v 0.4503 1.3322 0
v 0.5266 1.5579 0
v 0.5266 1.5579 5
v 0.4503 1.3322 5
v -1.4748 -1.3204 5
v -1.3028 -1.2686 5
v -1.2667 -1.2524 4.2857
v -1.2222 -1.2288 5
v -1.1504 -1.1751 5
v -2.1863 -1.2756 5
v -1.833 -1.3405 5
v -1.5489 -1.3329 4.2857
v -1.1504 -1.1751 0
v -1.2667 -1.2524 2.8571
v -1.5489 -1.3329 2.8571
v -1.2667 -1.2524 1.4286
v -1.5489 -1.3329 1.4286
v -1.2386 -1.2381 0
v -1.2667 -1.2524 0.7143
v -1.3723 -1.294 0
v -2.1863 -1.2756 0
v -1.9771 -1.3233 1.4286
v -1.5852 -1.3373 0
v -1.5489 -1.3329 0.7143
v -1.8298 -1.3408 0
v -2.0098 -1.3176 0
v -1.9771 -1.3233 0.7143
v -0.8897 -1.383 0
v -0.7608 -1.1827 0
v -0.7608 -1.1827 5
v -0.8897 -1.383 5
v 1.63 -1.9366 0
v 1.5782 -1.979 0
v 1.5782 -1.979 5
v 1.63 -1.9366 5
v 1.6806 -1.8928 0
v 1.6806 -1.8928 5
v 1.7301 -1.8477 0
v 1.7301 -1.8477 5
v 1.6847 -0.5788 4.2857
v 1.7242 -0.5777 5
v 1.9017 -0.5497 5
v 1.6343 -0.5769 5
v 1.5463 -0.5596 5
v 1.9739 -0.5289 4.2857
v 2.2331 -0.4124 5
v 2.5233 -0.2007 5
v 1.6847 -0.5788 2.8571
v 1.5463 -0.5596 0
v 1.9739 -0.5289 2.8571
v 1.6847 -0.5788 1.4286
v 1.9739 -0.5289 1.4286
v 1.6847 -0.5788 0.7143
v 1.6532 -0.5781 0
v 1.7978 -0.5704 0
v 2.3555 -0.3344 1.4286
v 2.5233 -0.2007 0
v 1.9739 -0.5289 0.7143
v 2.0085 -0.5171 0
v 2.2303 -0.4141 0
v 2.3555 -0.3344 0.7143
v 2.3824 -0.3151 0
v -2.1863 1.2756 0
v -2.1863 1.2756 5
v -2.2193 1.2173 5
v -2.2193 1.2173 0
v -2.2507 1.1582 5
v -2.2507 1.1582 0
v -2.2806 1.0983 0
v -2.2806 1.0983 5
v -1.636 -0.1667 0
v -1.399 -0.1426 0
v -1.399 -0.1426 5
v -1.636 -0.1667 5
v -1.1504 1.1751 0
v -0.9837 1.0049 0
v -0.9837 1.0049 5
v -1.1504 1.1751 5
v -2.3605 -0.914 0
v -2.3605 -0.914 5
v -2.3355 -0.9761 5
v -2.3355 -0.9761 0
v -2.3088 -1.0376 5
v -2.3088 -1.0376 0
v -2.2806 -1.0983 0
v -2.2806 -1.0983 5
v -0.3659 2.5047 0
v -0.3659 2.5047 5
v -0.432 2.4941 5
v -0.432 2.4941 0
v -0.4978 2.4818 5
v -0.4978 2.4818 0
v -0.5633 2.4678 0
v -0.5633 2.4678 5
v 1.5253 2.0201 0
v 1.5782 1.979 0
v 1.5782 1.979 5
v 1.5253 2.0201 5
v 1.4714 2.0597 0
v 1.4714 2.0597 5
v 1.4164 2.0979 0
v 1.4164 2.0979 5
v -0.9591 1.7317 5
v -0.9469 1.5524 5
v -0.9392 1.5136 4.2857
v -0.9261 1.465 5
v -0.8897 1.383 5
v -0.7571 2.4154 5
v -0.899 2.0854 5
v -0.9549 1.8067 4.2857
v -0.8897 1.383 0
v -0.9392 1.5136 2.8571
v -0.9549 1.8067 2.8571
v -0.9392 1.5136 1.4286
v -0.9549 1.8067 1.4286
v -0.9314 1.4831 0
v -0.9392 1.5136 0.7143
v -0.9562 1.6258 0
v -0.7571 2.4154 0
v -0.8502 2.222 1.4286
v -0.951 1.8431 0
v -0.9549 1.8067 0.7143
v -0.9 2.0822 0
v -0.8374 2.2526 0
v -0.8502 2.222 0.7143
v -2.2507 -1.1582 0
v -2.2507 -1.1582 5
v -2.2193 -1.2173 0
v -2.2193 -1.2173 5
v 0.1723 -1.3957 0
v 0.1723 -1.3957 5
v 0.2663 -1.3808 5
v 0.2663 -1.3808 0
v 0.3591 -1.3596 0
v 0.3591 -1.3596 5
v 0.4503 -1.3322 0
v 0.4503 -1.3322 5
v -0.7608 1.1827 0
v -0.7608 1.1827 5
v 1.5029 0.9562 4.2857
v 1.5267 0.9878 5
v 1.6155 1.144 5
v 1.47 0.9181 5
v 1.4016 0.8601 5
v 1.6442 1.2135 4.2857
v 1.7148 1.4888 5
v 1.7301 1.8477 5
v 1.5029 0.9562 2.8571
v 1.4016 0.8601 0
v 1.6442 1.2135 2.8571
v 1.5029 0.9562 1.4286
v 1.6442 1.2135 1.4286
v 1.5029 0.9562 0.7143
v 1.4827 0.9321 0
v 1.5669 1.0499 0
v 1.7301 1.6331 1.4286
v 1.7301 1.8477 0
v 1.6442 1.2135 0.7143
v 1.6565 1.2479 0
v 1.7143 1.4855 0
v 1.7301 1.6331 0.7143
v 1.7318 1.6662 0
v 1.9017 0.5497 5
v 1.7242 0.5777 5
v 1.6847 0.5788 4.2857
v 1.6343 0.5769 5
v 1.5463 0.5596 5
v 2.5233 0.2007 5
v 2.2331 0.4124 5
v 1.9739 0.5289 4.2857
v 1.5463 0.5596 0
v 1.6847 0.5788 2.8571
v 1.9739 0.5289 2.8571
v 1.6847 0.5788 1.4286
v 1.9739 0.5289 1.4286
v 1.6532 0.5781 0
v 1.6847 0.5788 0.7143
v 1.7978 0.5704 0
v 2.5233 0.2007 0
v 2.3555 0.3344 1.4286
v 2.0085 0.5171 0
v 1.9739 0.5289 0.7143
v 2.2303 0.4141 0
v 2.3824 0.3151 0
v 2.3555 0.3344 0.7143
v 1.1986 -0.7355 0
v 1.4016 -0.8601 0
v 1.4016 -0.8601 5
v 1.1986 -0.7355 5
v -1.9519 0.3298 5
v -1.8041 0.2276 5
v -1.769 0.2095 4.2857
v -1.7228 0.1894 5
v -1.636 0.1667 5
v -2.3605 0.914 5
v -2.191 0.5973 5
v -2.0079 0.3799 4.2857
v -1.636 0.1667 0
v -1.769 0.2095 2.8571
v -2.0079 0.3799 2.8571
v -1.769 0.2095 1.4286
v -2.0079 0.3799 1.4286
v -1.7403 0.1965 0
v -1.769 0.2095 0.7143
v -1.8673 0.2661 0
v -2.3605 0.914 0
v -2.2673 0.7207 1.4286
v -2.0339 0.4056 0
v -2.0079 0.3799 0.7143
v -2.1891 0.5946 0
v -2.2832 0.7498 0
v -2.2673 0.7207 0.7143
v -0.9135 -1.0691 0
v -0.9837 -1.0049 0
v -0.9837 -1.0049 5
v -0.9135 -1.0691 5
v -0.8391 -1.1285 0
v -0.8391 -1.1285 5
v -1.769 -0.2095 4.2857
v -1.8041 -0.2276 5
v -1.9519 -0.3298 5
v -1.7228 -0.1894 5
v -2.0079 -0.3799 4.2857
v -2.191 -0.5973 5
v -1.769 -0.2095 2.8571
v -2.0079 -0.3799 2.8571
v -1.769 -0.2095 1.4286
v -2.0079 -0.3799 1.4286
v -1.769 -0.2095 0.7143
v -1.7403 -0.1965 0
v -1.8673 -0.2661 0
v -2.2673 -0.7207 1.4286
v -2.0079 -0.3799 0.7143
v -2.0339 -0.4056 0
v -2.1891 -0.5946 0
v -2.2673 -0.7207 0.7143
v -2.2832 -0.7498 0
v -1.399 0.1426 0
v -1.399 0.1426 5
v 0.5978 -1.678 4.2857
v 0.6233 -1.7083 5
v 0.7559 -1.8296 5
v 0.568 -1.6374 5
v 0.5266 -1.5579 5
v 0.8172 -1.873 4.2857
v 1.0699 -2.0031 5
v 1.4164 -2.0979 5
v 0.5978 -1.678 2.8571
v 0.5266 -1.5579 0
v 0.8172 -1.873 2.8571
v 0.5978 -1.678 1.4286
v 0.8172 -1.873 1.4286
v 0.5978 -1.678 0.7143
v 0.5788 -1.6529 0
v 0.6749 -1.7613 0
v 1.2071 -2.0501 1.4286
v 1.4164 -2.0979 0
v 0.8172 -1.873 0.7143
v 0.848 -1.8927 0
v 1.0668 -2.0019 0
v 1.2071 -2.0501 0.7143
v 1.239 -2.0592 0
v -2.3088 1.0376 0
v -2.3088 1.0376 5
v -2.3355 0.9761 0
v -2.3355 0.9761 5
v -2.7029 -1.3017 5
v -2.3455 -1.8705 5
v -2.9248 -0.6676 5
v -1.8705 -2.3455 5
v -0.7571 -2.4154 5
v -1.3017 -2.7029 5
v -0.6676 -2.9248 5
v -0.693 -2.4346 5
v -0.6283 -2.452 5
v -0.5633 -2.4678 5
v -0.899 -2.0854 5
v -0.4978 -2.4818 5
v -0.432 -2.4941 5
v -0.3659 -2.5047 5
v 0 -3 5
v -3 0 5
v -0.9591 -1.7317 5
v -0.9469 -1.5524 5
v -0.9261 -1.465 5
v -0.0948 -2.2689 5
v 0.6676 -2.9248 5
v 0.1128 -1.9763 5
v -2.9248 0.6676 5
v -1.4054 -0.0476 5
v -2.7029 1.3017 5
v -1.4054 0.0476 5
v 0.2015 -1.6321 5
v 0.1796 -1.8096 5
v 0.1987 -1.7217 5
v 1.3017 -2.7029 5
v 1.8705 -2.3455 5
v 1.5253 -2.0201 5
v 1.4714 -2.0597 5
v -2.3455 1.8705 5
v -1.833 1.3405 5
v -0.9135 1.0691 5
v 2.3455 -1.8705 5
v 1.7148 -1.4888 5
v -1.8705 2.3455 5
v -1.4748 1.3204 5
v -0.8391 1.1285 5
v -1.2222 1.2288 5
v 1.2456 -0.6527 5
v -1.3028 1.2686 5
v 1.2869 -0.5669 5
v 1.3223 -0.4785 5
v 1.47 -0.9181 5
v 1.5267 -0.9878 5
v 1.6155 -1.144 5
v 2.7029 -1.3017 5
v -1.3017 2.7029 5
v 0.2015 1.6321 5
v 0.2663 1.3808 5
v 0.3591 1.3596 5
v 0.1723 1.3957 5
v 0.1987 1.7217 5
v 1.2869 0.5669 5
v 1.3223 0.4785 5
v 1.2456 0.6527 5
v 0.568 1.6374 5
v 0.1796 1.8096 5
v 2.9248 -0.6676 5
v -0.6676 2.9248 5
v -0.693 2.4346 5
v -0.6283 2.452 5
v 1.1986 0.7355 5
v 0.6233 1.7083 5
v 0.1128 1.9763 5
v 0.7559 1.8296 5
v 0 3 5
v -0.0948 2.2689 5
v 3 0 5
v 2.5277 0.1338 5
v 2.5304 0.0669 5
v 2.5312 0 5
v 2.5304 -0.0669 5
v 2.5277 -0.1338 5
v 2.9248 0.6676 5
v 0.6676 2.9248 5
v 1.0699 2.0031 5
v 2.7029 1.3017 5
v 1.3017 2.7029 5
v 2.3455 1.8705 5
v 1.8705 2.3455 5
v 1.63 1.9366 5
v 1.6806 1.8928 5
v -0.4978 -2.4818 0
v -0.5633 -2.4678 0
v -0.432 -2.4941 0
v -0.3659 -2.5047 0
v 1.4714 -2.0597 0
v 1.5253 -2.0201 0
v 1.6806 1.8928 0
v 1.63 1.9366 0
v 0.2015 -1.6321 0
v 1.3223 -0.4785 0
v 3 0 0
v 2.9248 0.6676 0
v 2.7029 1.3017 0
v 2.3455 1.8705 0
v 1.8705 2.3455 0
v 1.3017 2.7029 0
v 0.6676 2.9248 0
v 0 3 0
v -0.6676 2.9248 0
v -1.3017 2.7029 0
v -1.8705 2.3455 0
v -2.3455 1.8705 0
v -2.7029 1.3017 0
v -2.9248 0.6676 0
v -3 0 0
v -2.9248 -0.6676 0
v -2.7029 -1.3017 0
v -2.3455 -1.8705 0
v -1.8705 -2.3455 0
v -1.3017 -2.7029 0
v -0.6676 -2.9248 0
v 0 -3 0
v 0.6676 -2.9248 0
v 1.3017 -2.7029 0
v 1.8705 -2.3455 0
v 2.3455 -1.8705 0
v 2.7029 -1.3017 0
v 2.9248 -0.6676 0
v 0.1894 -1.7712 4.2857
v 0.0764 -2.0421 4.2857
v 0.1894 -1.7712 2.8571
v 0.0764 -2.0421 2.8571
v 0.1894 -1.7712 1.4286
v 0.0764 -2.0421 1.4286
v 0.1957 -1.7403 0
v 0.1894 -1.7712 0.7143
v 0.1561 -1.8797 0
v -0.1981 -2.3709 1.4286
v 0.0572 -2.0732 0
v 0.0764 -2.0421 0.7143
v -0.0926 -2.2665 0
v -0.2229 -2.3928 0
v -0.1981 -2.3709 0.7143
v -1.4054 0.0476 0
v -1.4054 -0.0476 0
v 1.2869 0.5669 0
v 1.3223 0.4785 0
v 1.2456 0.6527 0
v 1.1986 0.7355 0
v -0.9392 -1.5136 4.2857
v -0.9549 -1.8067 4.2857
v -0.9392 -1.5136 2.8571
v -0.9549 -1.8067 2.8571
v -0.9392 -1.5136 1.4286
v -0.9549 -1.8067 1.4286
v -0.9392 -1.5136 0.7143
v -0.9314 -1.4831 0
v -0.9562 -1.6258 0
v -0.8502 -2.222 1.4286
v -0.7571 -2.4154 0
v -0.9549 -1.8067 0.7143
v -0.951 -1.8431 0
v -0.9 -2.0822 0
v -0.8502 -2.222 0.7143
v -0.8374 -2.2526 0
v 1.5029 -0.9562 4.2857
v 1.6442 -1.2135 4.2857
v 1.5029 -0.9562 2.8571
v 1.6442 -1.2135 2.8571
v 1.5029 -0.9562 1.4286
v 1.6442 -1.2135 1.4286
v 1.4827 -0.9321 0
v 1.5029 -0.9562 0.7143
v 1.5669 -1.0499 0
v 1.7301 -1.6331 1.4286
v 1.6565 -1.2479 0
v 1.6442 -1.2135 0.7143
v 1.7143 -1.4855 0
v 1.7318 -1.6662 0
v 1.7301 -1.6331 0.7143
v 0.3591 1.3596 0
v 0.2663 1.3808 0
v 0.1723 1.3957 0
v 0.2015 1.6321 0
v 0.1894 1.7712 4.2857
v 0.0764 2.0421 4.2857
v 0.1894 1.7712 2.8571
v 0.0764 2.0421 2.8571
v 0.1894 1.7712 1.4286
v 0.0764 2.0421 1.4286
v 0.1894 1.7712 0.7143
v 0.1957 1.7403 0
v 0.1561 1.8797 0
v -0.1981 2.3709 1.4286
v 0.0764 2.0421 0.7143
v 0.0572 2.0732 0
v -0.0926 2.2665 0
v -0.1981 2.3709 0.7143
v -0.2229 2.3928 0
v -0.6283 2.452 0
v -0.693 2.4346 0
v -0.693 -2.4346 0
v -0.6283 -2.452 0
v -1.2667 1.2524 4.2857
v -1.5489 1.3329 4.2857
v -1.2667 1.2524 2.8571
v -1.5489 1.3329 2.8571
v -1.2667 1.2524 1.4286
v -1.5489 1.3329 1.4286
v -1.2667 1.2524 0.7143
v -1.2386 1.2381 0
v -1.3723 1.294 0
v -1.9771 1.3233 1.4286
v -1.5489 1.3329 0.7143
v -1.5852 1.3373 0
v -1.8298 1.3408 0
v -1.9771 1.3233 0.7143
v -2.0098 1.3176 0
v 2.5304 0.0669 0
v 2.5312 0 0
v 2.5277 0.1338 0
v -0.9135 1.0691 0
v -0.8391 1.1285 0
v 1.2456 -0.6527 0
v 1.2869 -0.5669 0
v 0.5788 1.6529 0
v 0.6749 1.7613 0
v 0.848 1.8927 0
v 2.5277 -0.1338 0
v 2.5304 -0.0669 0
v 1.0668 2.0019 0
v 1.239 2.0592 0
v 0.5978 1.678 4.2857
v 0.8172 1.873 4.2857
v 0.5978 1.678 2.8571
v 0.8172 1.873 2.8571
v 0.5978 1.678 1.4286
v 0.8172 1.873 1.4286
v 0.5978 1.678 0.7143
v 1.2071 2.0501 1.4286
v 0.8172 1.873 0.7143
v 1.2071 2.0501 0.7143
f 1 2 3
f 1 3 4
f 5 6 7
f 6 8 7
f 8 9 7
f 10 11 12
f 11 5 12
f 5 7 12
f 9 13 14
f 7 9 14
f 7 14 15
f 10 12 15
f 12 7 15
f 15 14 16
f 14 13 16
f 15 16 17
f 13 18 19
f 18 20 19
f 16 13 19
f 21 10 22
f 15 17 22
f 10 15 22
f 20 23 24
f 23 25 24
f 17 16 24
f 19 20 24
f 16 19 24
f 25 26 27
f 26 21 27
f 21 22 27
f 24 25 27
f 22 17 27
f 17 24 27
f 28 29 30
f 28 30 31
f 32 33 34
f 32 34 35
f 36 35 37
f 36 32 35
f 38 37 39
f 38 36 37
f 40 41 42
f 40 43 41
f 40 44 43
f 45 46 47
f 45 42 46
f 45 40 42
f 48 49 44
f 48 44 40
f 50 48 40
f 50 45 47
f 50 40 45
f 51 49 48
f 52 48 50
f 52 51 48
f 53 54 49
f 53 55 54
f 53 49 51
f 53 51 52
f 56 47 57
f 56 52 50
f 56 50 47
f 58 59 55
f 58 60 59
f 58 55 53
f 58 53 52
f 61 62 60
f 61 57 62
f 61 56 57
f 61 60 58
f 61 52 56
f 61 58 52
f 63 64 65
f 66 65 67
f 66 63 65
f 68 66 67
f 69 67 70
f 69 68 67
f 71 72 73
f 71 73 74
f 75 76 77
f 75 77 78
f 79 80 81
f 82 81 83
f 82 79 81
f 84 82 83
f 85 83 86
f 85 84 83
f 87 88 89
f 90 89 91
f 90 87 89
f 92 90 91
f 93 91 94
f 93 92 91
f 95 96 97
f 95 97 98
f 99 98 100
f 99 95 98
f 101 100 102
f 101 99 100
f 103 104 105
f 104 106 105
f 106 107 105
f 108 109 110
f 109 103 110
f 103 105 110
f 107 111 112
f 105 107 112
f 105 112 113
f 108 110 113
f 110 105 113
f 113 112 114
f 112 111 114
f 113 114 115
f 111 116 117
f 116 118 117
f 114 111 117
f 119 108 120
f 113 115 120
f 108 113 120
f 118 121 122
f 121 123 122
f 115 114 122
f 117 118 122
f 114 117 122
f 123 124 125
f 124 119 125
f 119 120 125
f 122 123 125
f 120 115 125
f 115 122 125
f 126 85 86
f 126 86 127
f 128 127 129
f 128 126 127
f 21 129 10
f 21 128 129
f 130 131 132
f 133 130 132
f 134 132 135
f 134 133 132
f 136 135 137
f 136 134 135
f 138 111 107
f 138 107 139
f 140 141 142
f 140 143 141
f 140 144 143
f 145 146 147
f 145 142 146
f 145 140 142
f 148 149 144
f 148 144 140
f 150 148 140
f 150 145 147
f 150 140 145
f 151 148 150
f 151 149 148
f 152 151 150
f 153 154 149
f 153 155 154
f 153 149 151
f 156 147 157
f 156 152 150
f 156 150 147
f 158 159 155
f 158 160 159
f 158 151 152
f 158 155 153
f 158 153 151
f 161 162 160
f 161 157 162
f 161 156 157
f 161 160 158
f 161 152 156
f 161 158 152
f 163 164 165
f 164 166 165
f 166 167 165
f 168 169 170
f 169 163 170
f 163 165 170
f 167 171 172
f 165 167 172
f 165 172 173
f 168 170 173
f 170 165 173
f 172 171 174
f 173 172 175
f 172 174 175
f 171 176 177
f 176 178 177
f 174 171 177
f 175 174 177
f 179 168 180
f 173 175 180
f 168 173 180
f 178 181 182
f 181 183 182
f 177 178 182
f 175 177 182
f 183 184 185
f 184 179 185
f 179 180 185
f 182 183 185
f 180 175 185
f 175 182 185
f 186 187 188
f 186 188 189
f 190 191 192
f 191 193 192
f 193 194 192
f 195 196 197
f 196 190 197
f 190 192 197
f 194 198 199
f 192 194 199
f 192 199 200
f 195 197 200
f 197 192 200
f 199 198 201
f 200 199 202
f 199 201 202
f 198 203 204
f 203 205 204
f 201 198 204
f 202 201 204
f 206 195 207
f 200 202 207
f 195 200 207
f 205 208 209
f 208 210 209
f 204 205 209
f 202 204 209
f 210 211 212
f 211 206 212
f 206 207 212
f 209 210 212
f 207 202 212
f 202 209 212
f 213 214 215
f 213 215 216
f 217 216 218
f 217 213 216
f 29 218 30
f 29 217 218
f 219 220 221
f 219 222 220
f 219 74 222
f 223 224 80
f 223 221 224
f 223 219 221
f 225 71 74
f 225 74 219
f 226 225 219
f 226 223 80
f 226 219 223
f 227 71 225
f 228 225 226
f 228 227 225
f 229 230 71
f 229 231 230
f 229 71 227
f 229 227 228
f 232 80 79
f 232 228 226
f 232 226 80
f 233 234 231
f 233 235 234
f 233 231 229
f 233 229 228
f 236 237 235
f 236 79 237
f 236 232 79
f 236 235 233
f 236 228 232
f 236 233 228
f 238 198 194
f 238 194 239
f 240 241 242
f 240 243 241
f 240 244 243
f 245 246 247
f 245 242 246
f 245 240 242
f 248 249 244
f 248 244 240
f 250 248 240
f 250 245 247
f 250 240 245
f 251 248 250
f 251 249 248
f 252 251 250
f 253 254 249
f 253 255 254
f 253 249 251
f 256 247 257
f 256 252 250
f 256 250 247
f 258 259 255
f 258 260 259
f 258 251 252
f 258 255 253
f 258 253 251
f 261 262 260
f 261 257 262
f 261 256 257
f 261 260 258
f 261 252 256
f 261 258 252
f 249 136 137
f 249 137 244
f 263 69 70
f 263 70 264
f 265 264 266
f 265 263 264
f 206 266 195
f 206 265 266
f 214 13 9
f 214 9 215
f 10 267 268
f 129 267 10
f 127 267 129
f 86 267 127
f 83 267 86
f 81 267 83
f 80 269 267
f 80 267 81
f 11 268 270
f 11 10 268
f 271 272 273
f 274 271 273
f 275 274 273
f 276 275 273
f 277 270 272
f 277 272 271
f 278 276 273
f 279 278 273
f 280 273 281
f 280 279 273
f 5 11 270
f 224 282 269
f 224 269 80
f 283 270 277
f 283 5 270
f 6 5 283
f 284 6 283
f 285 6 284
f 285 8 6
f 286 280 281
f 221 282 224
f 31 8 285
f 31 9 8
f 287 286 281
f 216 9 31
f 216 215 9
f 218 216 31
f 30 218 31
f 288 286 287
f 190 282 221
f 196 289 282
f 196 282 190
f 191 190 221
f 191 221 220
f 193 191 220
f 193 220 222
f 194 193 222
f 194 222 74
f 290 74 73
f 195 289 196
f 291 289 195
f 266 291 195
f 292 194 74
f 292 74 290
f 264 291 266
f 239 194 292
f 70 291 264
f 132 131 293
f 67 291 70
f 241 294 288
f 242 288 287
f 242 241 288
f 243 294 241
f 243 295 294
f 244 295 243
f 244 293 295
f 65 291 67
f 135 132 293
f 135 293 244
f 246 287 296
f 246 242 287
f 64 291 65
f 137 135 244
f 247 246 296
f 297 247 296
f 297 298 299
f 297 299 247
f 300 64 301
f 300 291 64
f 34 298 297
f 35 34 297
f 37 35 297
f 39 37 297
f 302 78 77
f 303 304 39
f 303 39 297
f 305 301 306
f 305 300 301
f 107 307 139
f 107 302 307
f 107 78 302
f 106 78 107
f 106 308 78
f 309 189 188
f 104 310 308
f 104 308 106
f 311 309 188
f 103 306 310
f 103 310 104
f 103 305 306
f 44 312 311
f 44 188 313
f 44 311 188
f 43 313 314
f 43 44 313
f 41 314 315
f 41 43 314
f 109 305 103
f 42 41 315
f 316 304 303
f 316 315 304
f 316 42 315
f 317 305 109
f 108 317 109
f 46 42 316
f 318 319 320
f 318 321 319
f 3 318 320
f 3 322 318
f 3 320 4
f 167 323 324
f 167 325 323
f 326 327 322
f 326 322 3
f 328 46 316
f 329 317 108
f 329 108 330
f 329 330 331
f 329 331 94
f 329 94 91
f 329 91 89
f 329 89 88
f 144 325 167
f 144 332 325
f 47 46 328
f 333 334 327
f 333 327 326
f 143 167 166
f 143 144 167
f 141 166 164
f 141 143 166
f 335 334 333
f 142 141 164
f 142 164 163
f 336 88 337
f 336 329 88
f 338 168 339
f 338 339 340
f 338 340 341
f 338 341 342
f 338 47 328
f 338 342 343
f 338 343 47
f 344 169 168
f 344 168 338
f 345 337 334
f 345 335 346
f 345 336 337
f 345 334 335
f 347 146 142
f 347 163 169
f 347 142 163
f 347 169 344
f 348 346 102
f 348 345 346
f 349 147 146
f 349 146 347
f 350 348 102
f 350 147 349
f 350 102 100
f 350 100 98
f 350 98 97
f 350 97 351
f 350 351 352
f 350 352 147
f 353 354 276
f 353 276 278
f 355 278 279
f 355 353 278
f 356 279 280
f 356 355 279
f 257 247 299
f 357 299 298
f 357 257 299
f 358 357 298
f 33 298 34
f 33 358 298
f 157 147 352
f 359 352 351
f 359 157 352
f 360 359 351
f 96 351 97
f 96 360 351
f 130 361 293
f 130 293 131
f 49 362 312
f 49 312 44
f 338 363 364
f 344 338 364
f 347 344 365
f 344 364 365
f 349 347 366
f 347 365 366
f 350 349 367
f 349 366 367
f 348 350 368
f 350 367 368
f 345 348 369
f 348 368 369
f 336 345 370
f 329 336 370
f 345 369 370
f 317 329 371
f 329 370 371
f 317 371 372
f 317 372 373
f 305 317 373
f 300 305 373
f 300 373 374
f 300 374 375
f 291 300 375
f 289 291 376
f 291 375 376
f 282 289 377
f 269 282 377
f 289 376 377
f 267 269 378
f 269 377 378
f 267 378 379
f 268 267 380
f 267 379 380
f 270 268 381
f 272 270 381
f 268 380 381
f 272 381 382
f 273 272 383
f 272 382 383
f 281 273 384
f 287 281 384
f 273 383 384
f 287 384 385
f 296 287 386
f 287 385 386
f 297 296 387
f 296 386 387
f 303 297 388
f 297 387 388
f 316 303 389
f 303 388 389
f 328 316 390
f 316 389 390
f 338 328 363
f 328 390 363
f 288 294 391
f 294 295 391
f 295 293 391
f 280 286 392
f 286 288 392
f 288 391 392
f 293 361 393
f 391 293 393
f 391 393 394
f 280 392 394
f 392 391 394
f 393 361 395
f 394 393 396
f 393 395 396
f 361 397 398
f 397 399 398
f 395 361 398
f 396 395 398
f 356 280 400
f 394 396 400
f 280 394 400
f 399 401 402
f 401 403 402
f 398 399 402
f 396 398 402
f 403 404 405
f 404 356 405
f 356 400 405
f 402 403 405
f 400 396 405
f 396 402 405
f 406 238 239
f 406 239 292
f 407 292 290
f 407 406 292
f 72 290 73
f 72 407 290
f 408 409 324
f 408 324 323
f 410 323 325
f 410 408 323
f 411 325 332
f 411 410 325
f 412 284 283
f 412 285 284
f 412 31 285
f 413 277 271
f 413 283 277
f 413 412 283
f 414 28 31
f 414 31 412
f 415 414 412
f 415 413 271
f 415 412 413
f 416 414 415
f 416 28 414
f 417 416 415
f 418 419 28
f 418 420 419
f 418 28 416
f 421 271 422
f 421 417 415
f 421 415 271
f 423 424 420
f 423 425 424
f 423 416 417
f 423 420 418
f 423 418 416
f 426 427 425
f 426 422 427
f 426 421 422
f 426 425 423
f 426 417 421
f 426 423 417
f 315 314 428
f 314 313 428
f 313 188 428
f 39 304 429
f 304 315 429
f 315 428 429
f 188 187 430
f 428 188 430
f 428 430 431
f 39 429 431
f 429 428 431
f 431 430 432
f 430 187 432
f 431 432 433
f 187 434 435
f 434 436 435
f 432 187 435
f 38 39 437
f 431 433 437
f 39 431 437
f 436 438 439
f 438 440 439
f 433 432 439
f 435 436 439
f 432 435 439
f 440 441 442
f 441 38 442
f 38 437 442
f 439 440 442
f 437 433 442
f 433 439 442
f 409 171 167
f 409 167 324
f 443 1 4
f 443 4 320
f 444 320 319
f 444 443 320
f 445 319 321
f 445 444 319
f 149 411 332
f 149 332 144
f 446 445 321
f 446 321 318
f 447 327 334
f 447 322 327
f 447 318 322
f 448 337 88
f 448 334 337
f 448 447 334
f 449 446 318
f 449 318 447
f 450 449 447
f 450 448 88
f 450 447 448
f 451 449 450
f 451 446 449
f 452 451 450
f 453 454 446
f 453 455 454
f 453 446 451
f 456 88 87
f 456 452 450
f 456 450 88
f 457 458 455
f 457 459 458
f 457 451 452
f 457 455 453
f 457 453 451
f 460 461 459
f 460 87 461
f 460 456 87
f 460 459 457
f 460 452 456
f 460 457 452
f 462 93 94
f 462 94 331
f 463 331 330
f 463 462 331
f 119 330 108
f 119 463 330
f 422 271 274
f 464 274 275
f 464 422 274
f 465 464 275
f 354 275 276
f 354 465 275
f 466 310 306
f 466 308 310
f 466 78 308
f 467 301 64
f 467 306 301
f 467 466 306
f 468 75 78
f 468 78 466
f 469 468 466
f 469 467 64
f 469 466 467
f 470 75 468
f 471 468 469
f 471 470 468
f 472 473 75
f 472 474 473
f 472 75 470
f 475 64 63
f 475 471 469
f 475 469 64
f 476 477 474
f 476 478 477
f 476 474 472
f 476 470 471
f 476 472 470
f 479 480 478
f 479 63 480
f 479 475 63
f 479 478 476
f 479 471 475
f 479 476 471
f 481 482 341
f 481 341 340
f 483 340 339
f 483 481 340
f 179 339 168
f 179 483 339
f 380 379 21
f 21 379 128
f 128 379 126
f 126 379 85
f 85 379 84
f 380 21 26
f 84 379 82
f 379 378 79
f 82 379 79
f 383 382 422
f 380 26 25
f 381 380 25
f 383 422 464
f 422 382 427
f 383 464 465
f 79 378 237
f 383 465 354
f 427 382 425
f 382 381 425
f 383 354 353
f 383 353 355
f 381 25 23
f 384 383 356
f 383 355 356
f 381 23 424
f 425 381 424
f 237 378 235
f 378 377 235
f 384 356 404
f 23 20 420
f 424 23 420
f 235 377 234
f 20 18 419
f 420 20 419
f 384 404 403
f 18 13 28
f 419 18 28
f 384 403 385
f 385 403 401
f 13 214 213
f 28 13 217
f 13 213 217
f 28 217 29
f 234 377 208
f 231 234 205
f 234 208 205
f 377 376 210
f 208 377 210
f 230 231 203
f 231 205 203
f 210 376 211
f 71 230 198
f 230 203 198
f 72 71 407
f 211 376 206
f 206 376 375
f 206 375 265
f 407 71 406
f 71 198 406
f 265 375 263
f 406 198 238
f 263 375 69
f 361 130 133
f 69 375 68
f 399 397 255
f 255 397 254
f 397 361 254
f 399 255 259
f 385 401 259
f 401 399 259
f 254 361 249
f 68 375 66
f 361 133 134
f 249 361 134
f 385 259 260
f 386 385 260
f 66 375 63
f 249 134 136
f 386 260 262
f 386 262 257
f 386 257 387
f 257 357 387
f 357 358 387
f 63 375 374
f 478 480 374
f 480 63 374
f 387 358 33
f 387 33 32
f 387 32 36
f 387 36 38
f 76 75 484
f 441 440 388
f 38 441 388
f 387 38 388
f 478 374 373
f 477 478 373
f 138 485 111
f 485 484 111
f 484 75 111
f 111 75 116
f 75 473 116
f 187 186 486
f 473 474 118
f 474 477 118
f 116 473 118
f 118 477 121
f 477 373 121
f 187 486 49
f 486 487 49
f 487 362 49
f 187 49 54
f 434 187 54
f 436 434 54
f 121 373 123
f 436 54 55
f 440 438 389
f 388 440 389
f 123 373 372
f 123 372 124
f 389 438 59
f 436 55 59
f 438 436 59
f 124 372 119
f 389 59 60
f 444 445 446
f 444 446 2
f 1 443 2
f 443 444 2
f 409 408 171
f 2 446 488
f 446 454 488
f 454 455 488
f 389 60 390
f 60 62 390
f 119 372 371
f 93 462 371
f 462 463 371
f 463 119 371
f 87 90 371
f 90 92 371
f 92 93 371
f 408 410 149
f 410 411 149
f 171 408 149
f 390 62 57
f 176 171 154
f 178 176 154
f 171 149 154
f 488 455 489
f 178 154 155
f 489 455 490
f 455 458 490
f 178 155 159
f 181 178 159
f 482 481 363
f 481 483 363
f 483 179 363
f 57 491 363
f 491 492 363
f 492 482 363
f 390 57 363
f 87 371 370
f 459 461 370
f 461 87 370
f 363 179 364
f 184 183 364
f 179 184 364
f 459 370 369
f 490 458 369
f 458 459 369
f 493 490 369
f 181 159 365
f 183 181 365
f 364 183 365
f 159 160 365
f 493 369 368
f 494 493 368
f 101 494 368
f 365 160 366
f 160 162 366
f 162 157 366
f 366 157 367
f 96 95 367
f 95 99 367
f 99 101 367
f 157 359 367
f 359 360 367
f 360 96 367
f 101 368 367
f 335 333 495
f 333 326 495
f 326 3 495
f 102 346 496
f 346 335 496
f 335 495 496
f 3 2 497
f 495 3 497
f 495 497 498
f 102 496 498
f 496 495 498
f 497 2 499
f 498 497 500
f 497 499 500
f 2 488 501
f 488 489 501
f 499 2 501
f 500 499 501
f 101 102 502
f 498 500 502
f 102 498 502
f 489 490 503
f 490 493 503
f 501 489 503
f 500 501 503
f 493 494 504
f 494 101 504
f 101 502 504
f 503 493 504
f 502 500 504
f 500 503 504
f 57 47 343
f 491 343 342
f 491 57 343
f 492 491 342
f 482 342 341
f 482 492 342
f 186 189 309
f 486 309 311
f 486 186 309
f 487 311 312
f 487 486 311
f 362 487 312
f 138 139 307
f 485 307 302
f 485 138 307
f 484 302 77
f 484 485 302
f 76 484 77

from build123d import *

# Parameters (mm, degrees)
SKETCH_1_R               = 3
SKETCH_1_R_2             = 1.40625
EXTRUDE_1_DEPTH          = 5
CUT_EXTRUDE_2_DEPTH      = 7.557438524
PATTERN_CIRCULAR_1_COUNT = 7


with BuildPart() as part:
    # 草图1 → 凸台-拉伸1 (new body)
    with BuildSketch(Plane.XY):
        Circle(SKETCH_1_R)
        Circle(SKETCH_1_R_2, mode=Mode.SUBTRACT)
    extrude(amount=EXTRUDE_1_DEPTH)

    # 草图1<3> → 切除-拉伸2 (cut, through all)
    with BuildSketch(Plane.XY):
        with BuildLine():
            Line((1.546319716, 0.559598866), (1.322324253, 0.478536971))
            ThreePointArc((1.322324253, 0.478536971), (1.385109661, 0.242920339), (1.40625, 0))
            ThreePointArc((1.40625, 0), (1.385109661, -0.242920339), (1.322324253, -0.478536971))
            Line((1.322324253, -0.478536971), (1.546319716, -0.559598866))
            add(Edge.make_bspline(
                [(1.546319716, -0.559598866), (1.558105463, -0.563864019), (1.591921474, -0.573215837), (1.658734166, -0.580959295), (1.767731952, -0.57845396), (1.907008009, -0.553308364), (2.079413065, -0.496026363), (2.261035814, -0.40341458), (2.393734523, -0.311147352), (2.48335867, -0.236539754), (2.523284743, -0.200650618)],
                knots=[0, 0, 0, 0, 0, 0.005604068, 0.015718248, 0.029959916, 0.048733667, 0.068727063, 0.096888892, 0.120945025, 0.120945025, 0.120945025, 0.120945025, 0.120945025], degree=4))
            ThreePointArc((2.523284743, -0.200650618), (2.529257902, -0.100404327), (2.53125, 0))
            ThreePointArc((2.53125, 0), (2.529257902, 0.100404327), (2.523284743, 0.200650618))
            add(Edge.make_bspline(
                [(1.546319716, 0.559598866), (1.558105463, 0.563864019), (1.591921474, 0.573215837), (1.658734166, 0.580959295), (1.767731952, 0.57845396), (1.907008009, 0.553308364), (2.079413065, 0.496026363), (2.261035814, 0.40341458), (2.393734523, 0.311147352), (2.48335867, 0.236539754), (2.523284743, 0.200650618)],
                knots=[0, 0, 0, 0, 0, 0.005604068, 0.015718248, 0.029959916, 0.048733667, 0.068727063, 0.096888892, 0.120945025, 0.120945025, 0.120945025, 0.120945025, 0.120945025], degree=4))
        make_face()
    cut_extrude_2 = extrude(amount=CUT_EXTRUDE_2_DEPTH, mode=Mode.SUBTRACT)

    # 阵列(圆周)1: 切除-拉伸2 ×7 about axis
    pattern_circular_1_axis = Axis((0, 0, 5), (0, 0, 1))
    for i in range(1, PATTERN_CIRCULAR_1_COUNT):
        add(cut_extrude_2.rotate(pattern_circular_1_axis, i * 360 / PATTERN_CIRCULAR_1_COUNT), mode=Mode.SUBTRACT)


solid = part.part
